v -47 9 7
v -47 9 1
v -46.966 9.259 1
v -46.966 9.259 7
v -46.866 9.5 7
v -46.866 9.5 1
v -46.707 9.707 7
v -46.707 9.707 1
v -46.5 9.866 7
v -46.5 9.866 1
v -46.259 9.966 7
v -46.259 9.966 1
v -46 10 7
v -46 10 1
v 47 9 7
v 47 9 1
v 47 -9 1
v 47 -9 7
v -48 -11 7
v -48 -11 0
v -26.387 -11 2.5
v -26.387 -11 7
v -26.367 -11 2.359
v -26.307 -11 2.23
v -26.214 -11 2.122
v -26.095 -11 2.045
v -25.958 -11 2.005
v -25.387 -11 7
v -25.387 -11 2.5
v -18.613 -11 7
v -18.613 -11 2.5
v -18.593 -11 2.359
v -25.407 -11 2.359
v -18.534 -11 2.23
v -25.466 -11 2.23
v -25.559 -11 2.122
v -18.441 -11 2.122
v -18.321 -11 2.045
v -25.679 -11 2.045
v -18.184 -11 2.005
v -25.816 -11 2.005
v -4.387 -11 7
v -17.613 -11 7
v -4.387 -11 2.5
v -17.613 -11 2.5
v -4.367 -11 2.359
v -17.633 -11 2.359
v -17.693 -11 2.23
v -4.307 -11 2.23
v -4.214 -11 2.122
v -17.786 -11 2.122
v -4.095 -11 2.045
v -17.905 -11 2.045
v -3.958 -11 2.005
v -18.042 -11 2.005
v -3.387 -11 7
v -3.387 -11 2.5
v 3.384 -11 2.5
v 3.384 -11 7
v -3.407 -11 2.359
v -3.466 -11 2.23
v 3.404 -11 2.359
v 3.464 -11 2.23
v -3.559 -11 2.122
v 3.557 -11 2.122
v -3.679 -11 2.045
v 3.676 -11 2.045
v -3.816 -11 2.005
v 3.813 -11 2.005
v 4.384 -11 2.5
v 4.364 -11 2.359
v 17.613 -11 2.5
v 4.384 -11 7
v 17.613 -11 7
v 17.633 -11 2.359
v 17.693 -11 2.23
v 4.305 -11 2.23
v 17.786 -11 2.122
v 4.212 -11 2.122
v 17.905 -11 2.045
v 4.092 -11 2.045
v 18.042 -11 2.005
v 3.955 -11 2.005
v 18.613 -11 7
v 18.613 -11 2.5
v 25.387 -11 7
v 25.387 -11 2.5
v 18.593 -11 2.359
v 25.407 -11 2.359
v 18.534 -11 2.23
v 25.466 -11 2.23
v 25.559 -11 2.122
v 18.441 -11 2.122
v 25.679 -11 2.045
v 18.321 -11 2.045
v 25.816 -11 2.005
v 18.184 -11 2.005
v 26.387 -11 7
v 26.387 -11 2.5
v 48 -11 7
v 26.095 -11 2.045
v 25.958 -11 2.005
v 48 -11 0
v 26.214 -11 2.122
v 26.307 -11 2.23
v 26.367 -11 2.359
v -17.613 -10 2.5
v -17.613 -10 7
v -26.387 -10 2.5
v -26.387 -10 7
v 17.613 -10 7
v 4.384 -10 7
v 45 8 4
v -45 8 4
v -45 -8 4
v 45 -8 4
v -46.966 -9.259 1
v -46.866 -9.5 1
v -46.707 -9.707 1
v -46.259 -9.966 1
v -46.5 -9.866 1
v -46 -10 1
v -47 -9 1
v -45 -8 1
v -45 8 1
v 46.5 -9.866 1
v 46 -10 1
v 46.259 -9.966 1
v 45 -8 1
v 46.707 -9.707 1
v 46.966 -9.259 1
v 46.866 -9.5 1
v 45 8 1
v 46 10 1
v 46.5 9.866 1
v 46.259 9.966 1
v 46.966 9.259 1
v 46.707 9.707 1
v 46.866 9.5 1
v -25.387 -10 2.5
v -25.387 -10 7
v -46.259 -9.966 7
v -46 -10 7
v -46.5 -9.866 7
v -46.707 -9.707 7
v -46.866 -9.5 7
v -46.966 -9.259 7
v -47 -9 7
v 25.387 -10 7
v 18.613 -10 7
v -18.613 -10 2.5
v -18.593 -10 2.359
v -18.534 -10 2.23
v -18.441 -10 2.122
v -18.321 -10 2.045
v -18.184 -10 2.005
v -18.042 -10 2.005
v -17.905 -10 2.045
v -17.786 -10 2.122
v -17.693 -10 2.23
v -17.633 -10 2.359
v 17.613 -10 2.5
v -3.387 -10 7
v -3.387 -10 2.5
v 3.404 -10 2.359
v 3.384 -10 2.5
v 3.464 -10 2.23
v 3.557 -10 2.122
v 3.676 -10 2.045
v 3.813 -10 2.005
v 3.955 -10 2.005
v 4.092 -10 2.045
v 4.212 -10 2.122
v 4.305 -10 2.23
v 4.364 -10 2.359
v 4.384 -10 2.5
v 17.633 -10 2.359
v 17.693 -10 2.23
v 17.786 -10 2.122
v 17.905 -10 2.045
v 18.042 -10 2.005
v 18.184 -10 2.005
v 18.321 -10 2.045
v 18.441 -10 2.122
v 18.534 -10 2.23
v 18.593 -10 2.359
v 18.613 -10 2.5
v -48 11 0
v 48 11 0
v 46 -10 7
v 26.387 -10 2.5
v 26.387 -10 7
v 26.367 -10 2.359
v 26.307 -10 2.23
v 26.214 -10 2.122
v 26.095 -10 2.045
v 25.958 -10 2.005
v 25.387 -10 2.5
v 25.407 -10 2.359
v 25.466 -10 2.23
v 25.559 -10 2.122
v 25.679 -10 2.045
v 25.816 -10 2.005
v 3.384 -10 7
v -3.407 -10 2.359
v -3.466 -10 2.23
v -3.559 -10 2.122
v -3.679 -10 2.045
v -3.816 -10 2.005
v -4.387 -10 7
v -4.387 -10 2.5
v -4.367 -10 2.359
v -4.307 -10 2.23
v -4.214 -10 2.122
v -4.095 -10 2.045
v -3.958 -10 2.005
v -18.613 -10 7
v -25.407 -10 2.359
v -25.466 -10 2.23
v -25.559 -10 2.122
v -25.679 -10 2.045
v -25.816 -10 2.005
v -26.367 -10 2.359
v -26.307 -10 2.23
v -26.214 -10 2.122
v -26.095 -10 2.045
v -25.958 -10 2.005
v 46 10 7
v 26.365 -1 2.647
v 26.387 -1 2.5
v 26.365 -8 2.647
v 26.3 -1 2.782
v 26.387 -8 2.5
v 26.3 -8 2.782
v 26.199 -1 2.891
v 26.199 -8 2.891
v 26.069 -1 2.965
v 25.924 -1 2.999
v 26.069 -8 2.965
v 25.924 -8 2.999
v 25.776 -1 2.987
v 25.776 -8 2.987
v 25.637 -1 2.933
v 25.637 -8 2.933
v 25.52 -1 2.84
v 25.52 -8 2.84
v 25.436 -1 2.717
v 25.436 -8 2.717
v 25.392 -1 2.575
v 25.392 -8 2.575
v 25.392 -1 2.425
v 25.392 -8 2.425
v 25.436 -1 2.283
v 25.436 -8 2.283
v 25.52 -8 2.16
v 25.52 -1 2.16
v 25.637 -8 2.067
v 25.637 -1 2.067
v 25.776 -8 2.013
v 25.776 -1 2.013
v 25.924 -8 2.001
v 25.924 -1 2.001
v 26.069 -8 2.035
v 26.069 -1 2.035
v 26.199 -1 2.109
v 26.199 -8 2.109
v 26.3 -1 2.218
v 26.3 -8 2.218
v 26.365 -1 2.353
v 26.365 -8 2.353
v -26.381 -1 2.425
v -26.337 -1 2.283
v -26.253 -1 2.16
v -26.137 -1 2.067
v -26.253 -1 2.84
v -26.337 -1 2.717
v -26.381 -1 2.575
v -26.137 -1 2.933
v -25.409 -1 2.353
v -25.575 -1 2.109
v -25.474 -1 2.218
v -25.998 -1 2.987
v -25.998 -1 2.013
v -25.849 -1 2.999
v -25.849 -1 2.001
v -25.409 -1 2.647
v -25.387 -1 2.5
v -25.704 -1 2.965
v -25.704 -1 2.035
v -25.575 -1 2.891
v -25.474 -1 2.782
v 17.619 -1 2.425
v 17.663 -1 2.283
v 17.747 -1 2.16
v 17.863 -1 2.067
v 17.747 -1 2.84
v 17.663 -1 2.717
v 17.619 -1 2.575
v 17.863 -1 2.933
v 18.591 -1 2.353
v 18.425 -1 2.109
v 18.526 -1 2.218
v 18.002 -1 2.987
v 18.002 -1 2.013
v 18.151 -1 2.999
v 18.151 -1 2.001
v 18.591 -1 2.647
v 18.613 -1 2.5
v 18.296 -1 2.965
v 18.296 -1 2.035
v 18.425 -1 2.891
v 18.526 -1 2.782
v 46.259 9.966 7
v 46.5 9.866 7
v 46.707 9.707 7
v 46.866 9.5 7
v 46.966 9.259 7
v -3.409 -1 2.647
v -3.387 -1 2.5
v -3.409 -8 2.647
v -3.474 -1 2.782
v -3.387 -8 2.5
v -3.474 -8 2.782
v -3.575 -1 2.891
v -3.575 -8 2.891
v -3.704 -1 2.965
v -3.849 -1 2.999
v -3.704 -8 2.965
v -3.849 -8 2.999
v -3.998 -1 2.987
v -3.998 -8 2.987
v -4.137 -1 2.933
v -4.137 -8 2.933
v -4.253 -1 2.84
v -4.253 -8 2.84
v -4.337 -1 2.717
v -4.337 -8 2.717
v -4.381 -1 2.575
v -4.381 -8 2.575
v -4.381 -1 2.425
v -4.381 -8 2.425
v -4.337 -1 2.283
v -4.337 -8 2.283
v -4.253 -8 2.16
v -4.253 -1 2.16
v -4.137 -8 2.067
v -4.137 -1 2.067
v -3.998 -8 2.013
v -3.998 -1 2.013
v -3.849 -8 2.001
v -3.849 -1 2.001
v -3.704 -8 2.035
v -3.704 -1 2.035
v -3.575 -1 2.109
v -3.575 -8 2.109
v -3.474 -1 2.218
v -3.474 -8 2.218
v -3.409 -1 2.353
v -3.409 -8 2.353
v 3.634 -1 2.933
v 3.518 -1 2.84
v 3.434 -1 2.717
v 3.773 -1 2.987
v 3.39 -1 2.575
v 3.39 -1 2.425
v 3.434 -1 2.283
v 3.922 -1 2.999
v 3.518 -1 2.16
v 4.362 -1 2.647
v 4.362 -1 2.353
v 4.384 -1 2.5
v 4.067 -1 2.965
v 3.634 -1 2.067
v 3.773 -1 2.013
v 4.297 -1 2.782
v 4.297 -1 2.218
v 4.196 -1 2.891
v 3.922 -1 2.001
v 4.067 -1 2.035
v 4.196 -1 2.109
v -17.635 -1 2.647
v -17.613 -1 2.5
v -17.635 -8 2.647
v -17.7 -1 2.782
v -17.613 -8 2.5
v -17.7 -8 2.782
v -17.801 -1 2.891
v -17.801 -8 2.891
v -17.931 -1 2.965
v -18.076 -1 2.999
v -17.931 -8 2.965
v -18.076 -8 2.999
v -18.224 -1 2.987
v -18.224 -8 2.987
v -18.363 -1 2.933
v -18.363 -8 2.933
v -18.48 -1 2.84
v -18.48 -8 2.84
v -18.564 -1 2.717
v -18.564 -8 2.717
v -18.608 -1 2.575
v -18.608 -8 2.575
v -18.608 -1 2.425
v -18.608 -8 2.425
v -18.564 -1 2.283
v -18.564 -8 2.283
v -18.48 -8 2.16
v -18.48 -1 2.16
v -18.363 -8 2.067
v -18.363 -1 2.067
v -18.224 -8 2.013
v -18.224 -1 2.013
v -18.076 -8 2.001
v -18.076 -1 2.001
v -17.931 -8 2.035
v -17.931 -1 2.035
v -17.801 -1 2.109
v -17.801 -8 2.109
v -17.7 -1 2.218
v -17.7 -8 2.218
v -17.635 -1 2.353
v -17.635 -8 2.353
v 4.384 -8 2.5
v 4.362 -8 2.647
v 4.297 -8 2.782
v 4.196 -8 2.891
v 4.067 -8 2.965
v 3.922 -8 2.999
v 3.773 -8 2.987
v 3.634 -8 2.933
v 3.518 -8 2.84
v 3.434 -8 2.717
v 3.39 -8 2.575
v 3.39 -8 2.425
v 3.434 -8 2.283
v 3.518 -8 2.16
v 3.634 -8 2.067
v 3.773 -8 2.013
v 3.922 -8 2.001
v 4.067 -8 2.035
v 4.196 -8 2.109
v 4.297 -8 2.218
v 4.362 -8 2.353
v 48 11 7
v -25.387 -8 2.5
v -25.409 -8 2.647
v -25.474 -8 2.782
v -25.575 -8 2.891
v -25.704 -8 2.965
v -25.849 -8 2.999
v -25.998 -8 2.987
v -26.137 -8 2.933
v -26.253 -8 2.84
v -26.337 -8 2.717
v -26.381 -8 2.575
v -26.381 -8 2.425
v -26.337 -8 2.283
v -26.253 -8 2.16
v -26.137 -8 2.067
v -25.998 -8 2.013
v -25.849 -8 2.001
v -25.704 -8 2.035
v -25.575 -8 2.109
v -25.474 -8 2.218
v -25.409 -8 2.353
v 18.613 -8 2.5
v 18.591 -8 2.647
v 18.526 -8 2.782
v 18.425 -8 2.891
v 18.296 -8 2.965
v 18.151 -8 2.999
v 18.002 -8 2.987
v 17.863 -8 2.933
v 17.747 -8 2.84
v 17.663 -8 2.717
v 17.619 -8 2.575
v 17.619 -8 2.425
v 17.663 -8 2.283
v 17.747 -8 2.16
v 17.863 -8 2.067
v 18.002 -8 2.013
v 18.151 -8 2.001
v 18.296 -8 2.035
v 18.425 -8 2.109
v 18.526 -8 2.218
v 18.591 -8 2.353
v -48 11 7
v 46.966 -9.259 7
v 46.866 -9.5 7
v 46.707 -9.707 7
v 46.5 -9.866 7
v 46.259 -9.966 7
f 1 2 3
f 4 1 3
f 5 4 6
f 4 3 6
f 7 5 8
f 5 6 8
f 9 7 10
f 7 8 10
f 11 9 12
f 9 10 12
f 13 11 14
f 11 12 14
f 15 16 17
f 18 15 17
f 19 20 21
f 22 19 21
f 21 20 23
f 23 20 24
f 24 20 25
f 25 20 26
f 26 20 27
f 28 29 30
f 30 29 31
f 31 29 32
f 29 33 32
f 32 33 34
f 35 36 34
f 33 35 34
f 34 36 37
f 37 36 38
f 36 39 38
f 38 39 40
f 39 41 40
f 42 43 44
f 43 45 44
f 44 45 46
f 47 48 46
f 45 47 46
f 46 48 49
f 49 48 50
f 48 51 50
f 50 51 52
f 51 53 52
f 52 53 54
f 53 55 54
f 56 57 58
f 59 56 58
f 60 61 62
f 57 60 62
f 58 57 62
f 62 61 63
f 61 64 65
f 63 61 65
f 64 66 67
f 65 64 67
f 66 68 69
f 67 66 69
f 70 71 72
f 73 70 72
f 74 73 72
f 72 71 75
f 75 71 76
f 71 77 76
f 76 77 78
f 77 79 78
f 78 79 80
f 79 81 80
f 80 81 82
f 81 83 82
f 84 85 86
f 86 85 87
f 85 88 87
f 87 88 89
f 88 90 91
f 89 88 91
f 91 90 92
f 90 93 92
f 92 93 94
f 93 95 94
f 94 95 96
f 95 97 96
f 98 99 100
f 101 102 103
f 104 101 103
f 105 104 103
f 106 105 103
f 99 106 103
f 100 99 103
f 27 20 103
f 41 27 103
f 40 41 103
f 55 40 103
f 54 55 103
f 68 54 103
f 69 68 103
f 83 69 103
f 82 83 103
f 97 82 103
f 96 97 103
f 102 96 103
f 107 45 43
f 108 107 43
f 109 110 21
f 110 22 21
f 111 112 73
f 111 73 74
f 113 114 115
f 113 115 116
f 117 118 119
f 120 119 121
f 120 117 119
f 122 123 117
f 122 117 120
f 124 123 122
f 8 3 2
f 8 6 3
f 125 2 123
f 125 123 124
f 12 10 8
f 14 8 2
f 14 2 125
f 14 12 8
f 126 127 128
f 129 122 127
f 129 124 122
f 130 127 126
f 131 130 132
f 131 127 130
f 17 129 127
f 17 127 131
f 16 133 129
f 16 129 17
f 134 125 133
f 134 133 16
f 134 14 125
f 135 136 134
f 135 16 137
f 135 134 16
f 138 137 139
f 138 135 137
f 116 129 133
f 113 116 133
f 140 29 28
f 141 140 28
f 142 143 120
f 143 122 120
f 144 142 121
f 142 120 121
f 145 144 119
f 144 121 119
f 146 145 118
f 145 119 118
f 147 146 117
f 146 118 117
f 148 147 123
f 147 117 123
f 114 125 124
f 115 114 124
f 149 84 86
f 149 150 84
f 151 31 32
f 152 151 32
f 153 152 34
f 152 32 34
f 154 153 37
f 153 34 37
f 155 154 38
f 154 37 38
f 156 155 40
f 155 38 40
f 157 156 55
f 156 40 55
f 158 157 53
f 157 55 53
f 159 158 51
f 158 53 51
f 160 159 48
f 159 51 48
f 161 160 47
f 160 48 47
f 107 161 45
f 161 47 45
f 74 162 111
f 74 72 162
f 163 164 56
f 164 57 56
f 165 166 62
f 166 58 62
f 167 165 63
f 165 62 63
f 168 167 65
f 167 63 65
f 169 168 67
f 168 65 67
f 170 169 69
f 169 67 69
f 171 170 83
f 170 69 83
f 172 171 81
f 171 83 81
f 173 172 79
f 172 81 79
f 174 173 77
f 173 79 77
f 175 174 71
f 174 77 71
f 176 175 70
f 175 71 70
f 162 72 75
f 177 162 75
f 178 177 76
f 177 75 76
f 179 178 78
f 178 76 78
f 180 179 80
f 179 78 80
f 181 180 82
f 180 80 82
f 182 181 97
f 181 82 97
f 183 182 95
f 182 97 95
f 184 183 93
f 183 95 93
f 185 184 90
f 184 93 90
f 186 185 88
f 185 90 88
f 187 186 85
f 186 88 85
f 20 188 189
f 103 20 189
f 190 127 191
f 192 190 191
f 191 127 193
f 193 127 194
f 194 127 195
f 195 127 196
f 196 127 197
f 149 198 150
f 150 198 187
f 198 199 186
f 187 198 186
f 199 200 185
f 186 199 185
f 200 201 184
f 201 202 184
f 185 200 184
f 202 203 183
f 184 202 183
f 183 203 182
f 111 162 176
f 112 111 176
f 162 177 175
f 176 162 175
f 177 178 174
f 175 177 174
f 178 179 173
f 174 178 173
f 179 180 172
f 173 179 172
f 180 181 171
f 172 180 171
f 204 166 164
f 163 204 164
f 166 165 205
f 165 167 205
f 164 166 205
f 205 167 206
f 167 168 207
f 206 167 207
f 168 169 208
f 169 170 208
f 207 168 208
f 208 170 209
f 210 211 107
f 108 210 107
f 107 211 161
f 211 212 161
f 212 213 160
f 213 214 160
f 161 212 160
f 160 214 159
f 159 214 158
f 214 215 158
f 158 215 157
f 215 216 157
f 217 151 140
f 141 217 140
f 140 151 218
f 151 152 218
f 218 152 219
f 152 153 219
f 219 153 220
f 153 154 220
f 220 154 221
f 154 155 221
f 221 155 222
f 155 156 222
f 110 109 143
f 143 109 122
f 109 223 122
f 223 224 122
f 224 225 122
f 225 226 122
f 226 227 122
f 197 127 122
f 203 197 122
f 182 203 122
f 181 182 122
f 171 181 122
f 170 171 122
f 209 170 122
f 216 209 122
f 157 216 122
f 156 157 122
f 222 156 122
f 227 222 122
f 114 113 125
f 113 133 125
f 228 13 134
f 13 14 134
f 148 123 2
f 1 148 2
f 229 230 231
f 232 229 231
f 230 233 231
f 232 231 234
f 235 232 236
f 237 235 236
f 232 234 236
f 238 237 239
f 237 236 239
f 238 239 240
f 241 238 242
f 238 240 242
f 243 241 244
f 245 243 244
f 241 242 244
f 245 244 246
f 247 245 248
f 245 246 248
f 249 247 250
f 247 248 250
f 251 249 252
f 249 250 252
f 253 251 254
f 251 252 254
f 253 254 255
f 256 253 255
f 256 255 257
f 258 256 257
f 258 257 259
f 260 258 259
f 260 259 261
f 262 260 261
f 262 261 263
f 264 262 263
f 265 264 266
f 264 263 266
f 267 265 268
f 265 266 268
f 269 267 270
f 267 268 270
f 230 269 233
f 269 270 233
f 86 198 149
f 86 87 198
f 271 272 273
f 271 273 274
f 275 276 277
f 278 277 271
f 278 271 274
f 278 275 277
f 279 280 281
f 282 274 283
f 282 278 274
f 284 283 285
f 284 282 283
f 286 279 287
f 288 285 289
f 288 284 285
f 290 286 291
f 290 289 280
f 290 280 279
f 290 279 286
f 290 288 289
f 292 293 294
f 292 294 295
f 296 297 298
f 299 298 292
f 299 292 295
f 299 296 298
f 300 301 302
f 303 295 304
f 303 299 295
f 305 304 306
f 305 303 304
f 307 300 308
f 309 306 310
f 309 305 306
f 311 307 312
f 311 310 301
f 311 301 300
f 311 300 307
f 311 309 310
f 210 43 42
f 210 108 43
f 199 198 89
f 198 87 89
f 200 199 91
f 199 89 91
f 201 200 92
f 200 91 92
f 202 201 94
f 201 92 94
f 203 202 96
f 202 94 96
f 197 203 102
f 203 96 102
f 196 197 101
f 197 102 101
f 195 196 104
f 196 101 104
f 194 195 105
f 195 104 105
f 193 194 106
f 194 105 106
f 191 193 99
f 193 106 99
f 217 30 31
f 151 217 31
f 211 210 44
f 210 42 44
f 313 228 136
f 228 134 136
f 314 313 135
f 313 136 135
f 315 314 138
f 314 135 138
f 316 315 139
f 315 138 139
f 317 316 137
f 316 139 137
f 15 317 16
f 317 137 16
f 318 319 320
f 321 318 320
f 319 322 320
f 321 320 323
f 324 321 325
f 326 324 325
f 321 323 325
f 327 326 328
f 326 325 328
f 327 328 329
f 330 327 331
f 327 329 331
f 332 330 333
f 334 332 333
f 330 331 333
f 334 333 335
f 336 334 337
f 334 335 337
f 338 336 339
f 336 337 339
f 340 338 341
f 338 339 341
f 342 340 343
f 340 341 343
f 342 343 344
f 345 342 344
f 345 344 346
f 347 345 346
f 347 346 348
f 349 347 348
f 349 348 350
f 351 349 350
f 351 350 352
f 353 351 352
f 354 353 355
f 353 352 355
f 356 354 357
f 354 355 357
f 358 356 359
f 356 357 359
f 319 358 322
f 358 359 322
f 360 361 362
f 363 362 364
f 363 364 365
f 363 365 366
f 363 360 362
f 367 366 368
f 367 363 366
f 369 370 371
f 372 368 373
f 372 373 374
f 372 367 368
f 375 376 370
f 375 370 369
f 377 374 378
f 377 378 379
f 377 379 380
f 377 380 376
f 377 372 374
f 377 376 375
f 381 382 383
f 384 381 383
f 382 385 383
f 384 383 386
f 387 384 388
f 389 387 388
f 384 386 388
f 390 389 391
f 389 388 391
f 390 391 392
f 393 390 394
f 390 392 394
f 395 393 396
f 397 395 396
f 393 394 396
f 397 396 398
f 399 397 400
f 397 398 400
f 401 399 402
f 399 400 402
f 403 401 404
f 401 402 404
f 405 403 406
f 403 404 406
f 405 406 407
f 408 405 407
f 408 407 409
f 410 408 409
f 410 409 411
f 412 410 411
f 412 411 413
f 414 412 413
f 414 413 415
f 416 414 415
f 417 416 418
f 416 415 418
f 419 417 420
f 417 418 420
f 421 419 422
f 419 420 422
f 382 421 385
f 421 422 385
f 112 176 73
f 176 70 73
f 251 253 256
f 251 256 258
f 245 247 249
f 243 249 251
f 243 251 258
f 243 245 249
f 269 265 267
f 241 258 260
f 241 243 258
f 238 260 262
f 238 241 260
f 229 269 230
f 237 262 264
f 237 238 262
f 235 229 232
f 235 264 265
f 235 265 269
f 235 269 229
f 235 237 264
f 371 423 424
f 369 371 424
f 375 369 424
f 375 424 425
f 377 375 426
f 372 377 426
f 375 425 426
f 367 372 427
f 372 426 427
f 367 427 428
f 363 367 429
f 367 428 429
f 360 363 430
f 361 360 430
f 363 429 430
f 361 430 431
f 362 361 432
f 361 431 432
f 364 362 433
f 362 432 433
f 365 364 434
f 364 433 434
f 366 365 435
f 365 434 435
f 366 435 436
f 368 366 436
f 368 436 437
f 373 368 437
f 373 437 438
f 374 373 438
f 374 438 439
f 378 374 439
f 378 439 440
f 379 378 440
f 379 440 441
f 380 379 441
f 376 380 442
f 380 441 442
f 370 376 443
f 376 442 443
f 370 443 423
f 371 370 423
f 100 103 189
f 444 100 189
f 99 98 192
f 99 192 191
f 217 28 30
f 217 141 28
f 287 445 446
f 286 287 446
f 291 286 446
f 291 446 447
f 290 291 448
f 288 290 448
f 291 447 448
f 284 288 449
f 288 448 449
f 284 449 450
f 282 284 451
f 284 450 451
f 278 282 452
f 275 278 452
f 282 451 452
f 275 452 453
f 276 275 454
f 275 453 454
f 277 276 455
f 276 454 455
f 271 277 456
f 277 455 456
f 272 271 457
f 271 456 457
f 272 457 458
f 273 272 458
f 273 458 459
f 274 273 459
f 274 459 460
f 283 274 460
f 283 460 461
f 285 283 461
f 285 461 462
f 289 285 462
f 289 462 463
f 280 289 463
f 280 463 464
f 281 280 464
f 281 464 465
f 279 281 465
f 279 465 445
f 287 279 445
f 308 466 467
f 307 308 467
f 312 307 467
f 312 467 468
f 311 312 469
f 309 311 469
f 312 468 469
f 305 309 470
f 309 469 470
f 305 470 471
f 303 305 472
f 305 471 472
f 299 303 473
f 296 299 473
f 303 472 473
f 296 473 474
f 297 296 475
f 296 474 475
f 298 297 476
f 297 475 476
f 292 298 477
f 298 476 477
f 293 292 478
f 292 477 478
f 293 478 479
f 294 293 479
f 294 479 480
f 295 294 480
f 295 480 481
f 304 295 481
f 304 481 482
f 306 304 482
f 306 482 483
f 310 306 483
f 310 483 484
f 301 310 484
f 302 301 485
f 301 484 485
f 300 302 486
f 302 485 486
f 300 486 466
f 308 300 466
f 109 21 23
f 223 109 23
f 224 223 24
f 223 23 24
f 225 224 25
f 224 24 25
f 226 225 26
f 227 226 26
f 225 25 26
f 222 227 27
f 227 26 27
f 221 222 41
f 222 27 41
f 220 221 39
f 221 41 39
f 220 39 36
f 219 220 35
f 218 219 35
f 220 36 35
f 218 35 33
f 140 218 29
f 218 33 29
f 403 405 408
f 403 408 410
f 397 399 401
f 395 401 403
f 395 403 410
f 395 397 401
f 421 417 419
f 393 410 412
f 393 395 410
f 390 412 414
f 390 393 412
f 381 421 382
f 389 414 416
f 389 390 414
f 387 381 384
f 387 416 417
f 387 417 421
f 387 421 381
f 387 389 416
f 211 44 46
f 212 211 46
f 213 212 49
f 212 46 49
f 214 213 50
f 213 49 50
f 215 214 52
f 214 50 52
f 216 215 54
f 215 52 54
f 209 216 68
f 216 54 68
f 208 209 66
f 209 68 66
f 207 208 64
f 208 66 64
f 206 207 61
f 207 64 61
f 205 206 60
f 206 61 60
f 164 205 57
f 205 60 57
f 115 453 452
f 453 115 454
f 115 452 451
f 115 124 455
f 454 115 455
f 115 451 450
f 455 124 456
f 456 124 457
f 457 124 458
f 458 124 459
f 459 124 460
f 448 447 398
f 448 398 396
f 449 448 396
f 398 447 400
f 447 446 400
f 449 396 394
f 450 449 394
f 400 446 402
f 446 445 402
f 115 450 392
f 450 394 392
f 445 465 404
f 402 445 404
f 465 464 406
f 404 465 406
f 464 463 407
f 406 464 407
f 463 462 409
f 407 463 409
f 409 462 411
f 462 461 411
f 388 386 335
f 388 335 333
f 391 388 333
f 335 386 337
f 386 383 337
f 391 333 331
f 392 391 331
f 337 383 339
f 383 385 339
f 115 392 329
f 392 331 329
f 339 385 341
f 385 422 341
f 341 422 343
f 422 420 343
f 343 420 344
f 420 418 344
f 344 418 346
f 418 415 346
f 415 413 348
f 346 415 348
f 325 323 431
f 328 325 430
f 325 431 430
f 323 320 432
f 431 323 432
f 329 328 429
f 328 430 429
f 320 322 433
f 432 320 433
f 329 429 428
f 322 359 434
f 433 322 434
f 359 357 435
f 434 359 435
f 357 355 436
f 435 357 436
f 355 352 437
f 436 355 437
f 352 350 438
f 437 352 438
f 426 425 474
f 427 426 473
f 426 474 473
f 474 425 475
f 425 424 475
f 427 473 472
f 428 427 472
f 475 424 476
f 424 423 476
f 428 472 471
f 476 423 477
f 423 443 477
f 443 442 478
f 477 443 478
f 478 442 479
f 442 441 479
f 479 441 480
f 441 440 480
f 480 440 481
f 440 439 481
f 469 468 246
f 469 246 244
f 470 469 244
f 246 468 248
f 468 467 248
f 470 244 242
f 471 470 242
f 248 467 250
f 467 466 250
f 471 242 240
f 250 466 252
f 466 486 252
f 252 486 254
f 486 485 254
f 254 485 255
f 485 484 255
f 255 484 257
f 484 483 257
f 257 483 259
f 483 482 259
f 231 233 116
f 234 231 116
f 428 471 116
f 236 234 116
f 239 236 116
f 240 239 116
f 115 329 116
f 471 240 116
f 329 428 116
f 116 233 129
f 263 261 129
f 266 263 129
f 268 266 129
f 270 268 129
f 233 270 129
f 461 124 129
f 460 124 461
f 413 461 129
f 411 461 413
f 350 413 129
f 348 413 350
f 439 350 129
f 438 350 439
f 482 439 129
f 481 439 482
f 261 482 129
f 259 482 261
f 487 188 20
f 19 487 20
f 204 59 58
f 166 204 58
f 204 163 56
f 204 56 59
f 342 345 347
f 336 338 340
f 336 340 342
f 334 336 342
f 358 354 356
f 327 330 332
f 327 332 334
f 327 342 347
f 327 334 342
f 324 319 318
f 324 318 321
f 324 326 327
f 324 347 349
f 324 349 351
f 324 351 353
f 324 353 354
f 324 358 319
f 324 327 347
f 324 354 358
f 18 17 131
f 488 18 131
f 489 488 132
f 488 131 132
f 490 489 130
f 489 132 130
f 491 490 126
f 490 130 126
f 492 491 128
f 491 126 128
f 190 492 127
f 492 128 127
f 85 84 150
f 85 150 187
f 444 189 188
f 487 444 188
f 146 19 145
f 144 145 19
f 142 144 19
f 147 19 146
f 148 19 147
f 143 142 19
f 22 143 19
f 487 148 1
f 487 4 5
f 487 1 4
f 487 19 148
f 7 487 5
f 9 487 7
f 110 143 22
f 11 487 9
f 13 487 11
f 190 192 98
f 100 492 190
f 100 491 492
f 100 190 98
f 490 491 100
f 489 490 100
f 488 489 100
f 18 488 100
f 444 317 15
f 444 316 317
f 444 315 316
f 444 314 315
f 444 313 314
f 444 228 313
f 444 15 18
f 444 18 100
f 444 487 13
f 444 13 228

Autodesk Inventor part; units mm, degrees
ref_plane "YZ Plane" through (0, 0, 0) normal (1, 0, 0) x (0, 1, 0)
ref_plane "XZ Plane" through (0, 0, 0) normal (0, 1, 0) x (-1, 0, 0)
ref_plane "XY Plane" through (0, 0, 0) normal (0, 0, 1) x (1, 0, 0)
sketch "Sketch2" plane through (0, 0, 0) normal (0, 0, 1) x (1, 0, 0)
  line L0 (-46, 10) -> (46, 10)
  line L1 (47, 9) -> (47, -9)
  line L2 (46, -10) -> (-46, -10)
  line L3 (-47, -9) -> (-47, 9)
  line L4 (-47, 10) -> (47, -10) construction
  line L5 (47, 10) -> (-47, -10) construction
  line L6 (45, 8) -> (-45, 8)
  line L7 (-45, 8) -> (-45, -8)
  line L8 (-45, -8) -> (45, -8)
  line L9 (45, -8) -> (45, 8)
  line L10 (48, 11) -> (-48, 11)
  line L11 (-48, 11) -> (-48, -11)
  line L12 (-48, -11) -> (48, -11)
  line L13 (48, -11) -> (48, 11)
  arc A0 (47, 9) -> (46, 10) centre (46, 9) ccw
  arc A1 (46, -10) -> (47, -9) centre (46, -9) ccw
  arc A2 (-47, -9) -> (-46, -10) centre (-46, -9) ccw
  arc A3 (-46, 10) -> (-47, 9) centre (-46, 9) ccw
  point P0 (0, 0)
  dimension "d0" = 94
  dimension "d1" = 20
  dimension "d2" = 2
  dimension "d3" = 1
  dimension "d10" = 1
  dimension "d40" = 90
extrude "Extrusion1" add sketch "Sketch2" along normal blind 1 contours L0 A0 L1 A1 L2 A2 L3 A3 | L9 L8 L7 L6 | L13 L12 L11 L10
extrude "Extrusion2" add sketch "Sketch2" along normal blind 7 contours L13 L12 L11 L10
extrude "Extrusion3" add sketch "Sketch2" along normal blind 4 contours L9 L8 L7 L6
sketch "Sketch4" plane through (-48, -11, 0) normal (0, -1, 0) x (1, 0, 0)
  circle A0 centre (22.1132, 5) radius 0.5
  circle A1 centre (29.8868, 5) radius 0.5
  circle A2 centre (44.1132, 5) radius 0.5
  circle A3 centre (51.8842, 5) radius 0.5
  circle A4 centre (66.1132, 5) radius 0.5
  circle A5 centre (73.8868, 5) radius 0.5
  line L0 (0, 6) -> (96, 6)
  line L1 (96, 7) -> (0, 7) projected
  line L2 (22.1132, 2) -> (22.1132, 2)
  line L3 (22.6132, 2.5) -> (22.6132, 8)
  line L4 (22.6132, 8) -> (21.6132, 8)
  line L5 (21.6132, 8) -> (21.6132, 2.5)
  line L6 (21.6132, 2) -> (22.6132, 8) construction
  line L7 (22.6132, 2) -> (21.6132, 8) construction
  line L8 (29.8868, 2) -> (29.8868, 2)
  line L9 (30.3868, 2.5) -> (30.3868, 8)
  line L10 (30.3868, 8) -> (29.3868, 8)
  line L11 (29.3868, 8) -> (29.3868, 2.5)
  line L12 (29.3868, 2) -> (30.3868, 8) construction
  line L13 (30.3868, 2) -> (29.3868, 8) construction
  line L14 (44.1132, 2) -> (44.1132, 2)
  line L15 (44.6132, 2.5) -> (44.6132, 8)
  line L16 (44.6132, 8) -> (43.6132, 8)
  line L17 (43.6132, 8) -> (43.6132, 2.5)
  line L18 (43.6132, 2) -> (44.6132, 8) construction
  line L19 (44.6132, 2) -> (43.6132, 8) construction
  line L20 (51.8842, 2) -> (51.8842, 2)
  line L21 (52.3842, 2.5) -> (52.3842, 8)
  line L22 (52.3842, 8) -> (51.3842, 8)
  line L23 (51.3842, 8) -> (51.3842, 2.5)
  line L24 (51.3842, 2) -> (52.3842, 8) construction
  line L25 (52.3842, 2) -> (51.3842, 8) construction
  line L26 (66.1132, 2) -> (66.1132, 2)
  line L27 (65.6132, 2.5) -> (65.6132, 8)
  line L28 (65.6132, 8) -> (66.6132, 8)
  line L29 (66.6132, 8) -> (66.6132, 2.5)
  line L30 (66.6132, 2) -> (65.6132, 8) construction
  line L31 (65.6132, 2) -> (66.6132, 8) construction
  line L32 (73.8868, 2) -> (73.8868, 2)
  line L33 (73.3868, 2.5) -> (73.3868, 8)
  line L34 (73.3868, 8) -> (74.3868, 8)
  line L35 (74.3868, 8) -> (74.3868, 2.5)
  line L36 (74.3868, 2) -> (73.3868, 8) construction
  line L37 (73.3868, 2) -> (74.3868, 8) construction
  arc A6 (21.6132, 2.5) -> (22.1132, 2) centre (22.1132, 2.5) ccw
  arc A7 (22.1132, 2) -> (22.6132, 2.5) centre (22.1132, 2.5) ccw
  arc A8 (29.3868, 2.5) -> (29.8868, 2) centre (29.8868, 2.5) ccw
  arc A9 (29.8868, 2) -> (30.3868, 2.5) centre (29.8868, 2.5) ccw
  arc A10 (43.6132, 2.5) -> (44.1132, 2) centre (44.1132, 2.5) ccw
  arc A11 (44.1132, 2) -> (44.6132, 2.5) centre (44.1132, 2.5) ccw
  arc A12 (51.3842, 2.5) -> (51.8842, 2) centre (51.8842, 2.5) ccw
  arc A13 (51.8842, 2) -> (52.3842, 2.5) centre (51.8842, 2.5) ccw
  arc A14 (65.6132, 2.5) -> (66.1132, 2) centre (66.1132, 2.5) ccw
  arc A15 (66.1132, 2) -> (66.6132, 2.5) centre (66.1132, 2.5) ccw
  arc A16 (73.3868, 2.5) -> (73.8868, 2) centre (73.8868, 2.5) ccw
  arc A17 (73.8868, 2) -> (74.3868, 2.5) centre (73.8868, 2.5) ccw
  point P0 (96, 0)
  point P1 (69, 6)
  point P2 (71, 6)
  point P3 (49, 6)
  point P4 (47, 6)
  point P5 (27, 6)
  point P6 (25, 6)
  point P7 (73.8868, 2)
  point P8 (66.1132, 2)
  point P9 (51.8842, 2)
  point P10 (44.1132, 2)
  point P11 (29.8868, 2)
  point P12 (22.1132, 2)
  dimension "d59" = 1
  dimension "d60" = 1
  dimension "d61" = 1
  dimension "d62" = 1
  dimension "d63" = 1
  dimension "d64" = 1
  dimension "d65" = 1
  dimension "d66" = 6
  dimension "d67" = 1
  dimension "d68" = 6
  dimension "d69" = 1
  dimension "d70" = 6
  dimension "d71" = 1
  dimension "d72" = 6
  dimension "d73" = 1
  dimension "d74" = 6
  dimension "d75" = 1
  dimension "d76" = 6
  dimension "d81" = 0.5
sketch "Sketch3" plane through (0, -11, 4) normal (0, -1, 0) x (1, 0, 0)
  line L0 (-53.1158, -2.5) -> (46.8842, -2.5) construction
  line L1 (43, -1.5) -> (23, -1.5) construction
  line L2 (23, -1.5) -> (23, 3.5) construction
  line L3 (23, 3.5) -> (43, 3.5) construction
  line L4 (43, 3.5) -> (43, -1.5) construction
  line L5 (23, -1.5) -> (23, 3.7137) construction
  line L6 (43, -1.5) -> (40.1132, 3.5) construction
  line L7 (46.8842, -2.5) -> (46.8842, 3.2735) construction
  line L8 (23, -1.5) -> (25.8868, 3.5) construction
  line L9 (23, -1.5) -> (23, 3.1279) construction
  line L10 (21, -1.5) -> (18.1132, 3.5) construction
  line L11 (1, 3.5) -> (21, 3.5) construction
  line L12 (1, -1.5) -> (3.8868, 3.5) construction
  line L13 (-1, -1.5) -> (-3.8868, 3.5) construction
  line L14 (-21, 3.5) -> (-1, 3.5) construction
  line L15 (-21, -1.5) -> (-18.1132, 3.5) construction
  line L16 (-23, -1.5) -> (-25.8868, 3.5) construction
  line L17 (-43, 3.5) -> (-23, 3.5) construction
  line L18 (-43, -1.5) -> (-40.1132, 3.5) construction
  line L19 (43, 3.5) -> (-43, 3.5) construction
  line L20 (0, 3.5) -> (0, 3.5) construction
  circle A0 centre (-25.8868, -1.5) radius 0.5
  circle A1 centre (-18.1132, -1.5) radius 0.5
  circle A2 centre (-3.8868, -1.5) radius 0.5
  circle A3 centre (3.8842, -1.5) radius 0.5
  circle A4 centre (18.1132, -1.5) radius 0.5
  circle A5 centre (25.8868, -1.5) radius 0.5
  line L21 (-45, 0) -> (-45, 0) projected
  line L22 (45, 0) -> (45, 0) projected
  line L23 (-48, -4) -> (-48, -4) projected
  line L24 (-48, -1.5) -> (48, -1.5)
  line L25 (48, -4) -> (48, -4) projected
  line L26 (48, -4) -> (48, 3) projected
  point P0 (3.8842, 2.5)
  point P1 (25.8868, -1.5)
  point P2 (48, -0.5)
  dimension "d45" = 20
  dimension "d46" = 5
  dimension "d47" = 30
  dimension "d48" = 30
  dimension "d49" = 22
  dimension "d52" = 0
  dimension "d53" = 1
  dimension "d54" = 1
  dimension "d55" = 1
  dimension "d56" = 1
  dimension "d57" = 1
  dimension "d58" = 1
  dimension "d82" = 1
extrude "Extrusion4" cut sketch "Sketch4" against normal blind 2 contours A0 | L3 A7 A6 L5 A0 | A0 L5 L0 L3 | L0 L5 L1 L3 | L11 L1 L9 L0 | L0 L9 A1 L11 | L1 L5 L4 L3 | L11 L10 L9 L1 | A1 | A1 L9 A9 A8 L11 | L17 L1 L15 L0 | L0 L15 A2 L17 | L17 L16 L15 L1 | A2 | A2 L15 A11 A10 L17 | L23 L1 L21 L0 | L0 L21 A3 L23 | L23 L22 L21 L1 | A3 | A3 L21 A13 A12 L23 | L27 L1 L29 L0 | L0 L29 A4 L27 | A4 | A4 L29 A15 A14 L27 | L27 L28 L29 L1 | L33 L1 L35 L0 | L0 L35 A5 L33 | A5 | A5 L35 A17 A16 L33 | L33 L34 L35 L1
extrude "Extrusion5" cut sketch "Sketch3" against normal blind 10
properties part number "sdm_finger_eit_chamber_mould_horizontal_e_holes"
